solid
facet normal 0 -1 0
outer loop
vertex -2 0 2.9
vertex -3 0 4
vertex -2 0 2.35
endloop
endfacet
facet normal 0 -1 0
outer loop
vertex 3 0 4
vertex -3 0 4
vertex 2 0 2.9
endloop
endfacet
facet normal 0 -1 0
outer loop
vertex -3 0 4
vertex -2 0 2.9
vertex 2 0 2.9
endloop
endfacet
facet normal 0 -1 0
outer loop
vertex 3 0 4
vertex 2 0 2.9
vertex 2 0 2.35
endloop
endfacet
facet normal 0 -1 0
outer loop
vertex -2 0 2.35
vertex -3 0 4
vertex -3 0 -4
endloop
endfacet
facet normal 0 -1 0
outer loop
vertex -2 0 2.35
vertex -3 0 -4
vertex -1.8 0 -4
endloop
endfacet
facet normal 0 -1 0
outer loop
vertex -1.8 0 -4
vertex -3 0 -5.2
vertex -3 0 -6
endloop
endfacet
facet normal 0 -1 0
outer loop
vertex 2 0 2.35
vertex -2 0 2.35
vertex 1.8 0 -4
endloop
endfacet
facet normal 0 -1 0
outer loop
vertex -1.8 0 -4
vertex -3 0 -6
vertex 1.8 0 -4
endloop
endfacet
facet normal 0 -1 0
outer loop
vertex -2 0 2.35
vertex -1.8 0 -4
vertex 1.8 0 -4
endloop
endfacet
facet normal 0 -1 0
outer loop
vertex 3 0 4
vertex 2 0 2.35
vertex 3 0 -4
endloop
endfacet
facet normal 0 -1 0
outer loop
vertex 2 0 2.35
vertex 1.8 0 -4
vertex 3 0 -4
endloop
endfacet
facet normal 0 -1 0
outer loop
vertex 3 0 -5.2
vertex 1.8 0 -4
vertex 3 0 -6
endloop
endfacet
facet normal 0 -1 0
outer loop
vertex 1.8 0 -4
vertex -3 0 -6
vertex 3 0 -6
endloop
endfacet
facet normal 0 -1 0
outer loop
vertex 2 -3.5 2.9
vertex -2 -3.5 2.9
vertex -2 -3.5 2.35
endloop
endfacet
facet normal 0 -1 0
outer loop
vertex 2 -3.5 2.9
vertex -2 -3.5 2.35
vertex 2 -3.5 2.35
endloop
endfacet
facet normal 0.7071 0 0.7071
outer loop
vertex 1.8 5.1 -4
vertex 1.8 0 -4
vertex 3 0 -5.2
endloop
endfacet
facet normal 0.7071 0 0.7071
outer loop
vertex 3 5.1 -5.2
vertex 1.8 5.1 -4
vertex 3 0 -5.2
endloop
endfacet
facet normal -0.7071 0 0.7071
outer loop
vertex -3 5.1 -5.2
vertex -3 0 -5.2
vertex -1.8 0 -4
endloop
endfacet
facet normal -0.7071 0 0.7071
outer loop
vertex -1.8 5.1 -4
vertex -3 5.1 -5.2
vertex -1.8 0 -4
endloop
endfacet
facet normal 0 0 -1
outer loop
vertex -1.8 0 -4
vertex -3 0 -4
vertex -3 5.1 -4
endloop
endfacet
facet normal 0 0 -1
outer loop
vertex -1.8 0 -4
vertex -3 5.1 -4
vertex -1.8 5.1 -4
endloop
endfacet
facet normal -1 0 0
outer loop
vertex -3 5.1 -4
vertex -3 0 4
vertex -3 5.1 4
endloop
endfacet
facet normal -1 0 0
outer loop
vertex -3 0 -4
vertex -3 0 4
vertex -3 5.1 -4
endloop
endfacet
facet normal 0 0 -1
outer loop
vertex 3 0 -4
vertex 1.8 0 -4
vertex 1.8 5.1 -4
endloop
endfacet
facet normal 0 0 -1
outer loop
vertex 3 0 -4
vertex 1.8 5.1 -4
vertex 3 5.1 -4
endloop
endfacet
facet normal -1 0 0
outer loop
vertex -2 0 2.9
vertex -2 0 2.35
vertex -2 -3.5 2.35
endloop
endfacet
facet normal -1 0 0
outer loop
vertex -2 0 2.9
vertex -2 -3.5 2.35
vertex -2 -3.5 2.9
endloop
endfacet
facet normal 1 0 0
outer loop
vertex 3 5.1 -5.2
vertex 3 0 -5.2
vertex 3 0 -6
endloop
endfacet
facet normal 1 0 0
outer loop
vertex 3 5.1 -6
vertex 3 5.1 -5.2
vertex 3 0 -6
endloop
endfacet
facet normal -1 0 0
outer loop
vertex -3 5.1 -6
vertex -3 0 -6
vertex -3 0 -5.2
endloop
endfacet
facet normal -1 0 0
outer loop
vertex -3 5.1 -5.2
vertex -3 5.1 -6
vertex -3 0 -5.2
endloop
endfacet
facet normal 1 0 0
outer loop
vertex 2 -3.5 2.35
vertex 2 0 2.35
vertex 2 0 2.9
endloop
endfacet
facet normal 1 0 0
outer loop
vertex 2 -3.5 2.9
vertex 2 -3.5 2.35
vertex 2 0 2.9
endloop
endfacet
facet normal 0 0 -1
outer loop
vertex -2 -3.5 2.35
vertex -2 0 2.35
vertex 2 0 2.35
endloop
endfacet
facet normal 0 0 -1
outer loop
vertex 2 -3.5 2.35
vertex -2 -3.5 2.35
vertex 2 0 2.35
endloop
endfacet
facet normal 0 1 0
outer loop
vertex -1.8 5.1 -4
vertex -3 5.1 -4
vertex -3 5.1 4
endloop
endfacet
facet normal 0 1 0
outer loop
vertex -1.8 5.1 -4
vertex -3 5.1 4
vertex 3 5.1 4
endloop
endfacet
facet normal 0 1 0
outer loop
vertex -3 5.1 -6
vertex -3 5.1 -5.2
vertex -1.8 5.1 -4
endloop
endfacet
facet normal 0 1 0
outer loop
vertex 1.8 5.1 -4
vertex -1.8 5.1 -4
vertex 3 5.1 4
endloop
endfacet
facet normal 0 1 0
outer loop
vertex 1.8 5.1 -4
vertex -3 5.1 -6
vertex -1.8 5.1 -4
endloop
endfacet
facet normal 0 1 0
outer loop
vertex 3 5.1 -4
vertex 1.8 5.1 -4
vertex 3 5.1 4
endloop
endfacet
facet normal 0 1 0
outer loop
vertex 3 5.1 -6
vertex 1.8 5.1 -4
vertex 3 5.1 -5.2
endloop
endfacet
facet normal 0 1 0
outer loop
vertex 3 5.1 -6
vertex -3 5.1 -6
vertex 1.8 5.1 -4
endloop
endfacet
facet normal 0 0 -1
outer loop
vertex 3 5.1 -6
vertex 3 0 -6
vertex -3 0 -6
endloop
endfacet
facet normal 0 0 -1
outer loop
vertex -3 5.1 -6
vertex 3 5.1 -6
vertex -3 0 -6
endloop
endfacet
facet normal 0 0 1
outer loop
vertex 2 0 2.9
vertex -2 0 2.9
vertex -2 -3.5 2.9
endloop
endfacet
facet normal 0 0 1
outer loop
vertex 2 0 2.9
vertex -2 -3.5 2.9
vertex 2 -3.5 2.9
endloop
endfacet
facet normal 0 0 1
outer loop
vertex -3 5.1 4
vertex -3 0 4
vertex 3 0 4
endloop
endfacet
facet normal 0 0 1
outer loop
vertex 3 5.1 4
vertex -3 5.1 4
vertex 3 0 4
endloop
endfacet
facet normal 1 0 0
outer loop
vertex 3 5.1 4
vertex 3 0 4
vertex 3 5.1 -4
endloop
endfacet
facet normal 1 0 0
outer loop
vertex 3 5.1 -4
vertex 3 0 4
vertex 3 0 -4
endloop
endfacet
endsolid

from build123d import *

# Parameters (mm, degrees)
SKETCH1_W           = 6
SKETCH1_H           = 8
BOSS_EXTRUDE1_DEPTH = 5.1
BOSS_EXTRUDE2_DEPTH = 5.1
SKETCH3_W           = 4
SKETCH3_H           = 0.55
BOSS_EXTRUDE3_DEPTH = 3.5


with BuildPart() as part:
    # Sketch1 → Boss-Extrude1 (new body)
    with BuildSketch(Plane(origin=(0, 0, 0), x_dir=(1, 0, 0), z_dir=(0, 1, 0))):
        Rectangle(SKETCH1_W, SKETCH1_H)
    extrude(amount=BOSS_EXTRUDE1_DEPTH)

    # Sketch2 → Boss-Extrude2 (add)
    with BuildSketch(Plane.XZ):
        Polygon((3, -6), (-3, -6), (-3, -5.2), (-1.8, -4), (1.8, -4), (3, -5.2), align=None)
    extrude(amount=-BOSS_EXTRUDE2_DEPTH)

    # Sketch3 → Boss-Extrude3 (add)
    with BuildSketch(Plane.XZ):
        with Locations((0, 2.625)):
            Rectangle(SKETCH3_W, SKETCH3_H)
    extrude(amount=BOSS_EXTRUDE3_DEPTH)


solid = part.part
